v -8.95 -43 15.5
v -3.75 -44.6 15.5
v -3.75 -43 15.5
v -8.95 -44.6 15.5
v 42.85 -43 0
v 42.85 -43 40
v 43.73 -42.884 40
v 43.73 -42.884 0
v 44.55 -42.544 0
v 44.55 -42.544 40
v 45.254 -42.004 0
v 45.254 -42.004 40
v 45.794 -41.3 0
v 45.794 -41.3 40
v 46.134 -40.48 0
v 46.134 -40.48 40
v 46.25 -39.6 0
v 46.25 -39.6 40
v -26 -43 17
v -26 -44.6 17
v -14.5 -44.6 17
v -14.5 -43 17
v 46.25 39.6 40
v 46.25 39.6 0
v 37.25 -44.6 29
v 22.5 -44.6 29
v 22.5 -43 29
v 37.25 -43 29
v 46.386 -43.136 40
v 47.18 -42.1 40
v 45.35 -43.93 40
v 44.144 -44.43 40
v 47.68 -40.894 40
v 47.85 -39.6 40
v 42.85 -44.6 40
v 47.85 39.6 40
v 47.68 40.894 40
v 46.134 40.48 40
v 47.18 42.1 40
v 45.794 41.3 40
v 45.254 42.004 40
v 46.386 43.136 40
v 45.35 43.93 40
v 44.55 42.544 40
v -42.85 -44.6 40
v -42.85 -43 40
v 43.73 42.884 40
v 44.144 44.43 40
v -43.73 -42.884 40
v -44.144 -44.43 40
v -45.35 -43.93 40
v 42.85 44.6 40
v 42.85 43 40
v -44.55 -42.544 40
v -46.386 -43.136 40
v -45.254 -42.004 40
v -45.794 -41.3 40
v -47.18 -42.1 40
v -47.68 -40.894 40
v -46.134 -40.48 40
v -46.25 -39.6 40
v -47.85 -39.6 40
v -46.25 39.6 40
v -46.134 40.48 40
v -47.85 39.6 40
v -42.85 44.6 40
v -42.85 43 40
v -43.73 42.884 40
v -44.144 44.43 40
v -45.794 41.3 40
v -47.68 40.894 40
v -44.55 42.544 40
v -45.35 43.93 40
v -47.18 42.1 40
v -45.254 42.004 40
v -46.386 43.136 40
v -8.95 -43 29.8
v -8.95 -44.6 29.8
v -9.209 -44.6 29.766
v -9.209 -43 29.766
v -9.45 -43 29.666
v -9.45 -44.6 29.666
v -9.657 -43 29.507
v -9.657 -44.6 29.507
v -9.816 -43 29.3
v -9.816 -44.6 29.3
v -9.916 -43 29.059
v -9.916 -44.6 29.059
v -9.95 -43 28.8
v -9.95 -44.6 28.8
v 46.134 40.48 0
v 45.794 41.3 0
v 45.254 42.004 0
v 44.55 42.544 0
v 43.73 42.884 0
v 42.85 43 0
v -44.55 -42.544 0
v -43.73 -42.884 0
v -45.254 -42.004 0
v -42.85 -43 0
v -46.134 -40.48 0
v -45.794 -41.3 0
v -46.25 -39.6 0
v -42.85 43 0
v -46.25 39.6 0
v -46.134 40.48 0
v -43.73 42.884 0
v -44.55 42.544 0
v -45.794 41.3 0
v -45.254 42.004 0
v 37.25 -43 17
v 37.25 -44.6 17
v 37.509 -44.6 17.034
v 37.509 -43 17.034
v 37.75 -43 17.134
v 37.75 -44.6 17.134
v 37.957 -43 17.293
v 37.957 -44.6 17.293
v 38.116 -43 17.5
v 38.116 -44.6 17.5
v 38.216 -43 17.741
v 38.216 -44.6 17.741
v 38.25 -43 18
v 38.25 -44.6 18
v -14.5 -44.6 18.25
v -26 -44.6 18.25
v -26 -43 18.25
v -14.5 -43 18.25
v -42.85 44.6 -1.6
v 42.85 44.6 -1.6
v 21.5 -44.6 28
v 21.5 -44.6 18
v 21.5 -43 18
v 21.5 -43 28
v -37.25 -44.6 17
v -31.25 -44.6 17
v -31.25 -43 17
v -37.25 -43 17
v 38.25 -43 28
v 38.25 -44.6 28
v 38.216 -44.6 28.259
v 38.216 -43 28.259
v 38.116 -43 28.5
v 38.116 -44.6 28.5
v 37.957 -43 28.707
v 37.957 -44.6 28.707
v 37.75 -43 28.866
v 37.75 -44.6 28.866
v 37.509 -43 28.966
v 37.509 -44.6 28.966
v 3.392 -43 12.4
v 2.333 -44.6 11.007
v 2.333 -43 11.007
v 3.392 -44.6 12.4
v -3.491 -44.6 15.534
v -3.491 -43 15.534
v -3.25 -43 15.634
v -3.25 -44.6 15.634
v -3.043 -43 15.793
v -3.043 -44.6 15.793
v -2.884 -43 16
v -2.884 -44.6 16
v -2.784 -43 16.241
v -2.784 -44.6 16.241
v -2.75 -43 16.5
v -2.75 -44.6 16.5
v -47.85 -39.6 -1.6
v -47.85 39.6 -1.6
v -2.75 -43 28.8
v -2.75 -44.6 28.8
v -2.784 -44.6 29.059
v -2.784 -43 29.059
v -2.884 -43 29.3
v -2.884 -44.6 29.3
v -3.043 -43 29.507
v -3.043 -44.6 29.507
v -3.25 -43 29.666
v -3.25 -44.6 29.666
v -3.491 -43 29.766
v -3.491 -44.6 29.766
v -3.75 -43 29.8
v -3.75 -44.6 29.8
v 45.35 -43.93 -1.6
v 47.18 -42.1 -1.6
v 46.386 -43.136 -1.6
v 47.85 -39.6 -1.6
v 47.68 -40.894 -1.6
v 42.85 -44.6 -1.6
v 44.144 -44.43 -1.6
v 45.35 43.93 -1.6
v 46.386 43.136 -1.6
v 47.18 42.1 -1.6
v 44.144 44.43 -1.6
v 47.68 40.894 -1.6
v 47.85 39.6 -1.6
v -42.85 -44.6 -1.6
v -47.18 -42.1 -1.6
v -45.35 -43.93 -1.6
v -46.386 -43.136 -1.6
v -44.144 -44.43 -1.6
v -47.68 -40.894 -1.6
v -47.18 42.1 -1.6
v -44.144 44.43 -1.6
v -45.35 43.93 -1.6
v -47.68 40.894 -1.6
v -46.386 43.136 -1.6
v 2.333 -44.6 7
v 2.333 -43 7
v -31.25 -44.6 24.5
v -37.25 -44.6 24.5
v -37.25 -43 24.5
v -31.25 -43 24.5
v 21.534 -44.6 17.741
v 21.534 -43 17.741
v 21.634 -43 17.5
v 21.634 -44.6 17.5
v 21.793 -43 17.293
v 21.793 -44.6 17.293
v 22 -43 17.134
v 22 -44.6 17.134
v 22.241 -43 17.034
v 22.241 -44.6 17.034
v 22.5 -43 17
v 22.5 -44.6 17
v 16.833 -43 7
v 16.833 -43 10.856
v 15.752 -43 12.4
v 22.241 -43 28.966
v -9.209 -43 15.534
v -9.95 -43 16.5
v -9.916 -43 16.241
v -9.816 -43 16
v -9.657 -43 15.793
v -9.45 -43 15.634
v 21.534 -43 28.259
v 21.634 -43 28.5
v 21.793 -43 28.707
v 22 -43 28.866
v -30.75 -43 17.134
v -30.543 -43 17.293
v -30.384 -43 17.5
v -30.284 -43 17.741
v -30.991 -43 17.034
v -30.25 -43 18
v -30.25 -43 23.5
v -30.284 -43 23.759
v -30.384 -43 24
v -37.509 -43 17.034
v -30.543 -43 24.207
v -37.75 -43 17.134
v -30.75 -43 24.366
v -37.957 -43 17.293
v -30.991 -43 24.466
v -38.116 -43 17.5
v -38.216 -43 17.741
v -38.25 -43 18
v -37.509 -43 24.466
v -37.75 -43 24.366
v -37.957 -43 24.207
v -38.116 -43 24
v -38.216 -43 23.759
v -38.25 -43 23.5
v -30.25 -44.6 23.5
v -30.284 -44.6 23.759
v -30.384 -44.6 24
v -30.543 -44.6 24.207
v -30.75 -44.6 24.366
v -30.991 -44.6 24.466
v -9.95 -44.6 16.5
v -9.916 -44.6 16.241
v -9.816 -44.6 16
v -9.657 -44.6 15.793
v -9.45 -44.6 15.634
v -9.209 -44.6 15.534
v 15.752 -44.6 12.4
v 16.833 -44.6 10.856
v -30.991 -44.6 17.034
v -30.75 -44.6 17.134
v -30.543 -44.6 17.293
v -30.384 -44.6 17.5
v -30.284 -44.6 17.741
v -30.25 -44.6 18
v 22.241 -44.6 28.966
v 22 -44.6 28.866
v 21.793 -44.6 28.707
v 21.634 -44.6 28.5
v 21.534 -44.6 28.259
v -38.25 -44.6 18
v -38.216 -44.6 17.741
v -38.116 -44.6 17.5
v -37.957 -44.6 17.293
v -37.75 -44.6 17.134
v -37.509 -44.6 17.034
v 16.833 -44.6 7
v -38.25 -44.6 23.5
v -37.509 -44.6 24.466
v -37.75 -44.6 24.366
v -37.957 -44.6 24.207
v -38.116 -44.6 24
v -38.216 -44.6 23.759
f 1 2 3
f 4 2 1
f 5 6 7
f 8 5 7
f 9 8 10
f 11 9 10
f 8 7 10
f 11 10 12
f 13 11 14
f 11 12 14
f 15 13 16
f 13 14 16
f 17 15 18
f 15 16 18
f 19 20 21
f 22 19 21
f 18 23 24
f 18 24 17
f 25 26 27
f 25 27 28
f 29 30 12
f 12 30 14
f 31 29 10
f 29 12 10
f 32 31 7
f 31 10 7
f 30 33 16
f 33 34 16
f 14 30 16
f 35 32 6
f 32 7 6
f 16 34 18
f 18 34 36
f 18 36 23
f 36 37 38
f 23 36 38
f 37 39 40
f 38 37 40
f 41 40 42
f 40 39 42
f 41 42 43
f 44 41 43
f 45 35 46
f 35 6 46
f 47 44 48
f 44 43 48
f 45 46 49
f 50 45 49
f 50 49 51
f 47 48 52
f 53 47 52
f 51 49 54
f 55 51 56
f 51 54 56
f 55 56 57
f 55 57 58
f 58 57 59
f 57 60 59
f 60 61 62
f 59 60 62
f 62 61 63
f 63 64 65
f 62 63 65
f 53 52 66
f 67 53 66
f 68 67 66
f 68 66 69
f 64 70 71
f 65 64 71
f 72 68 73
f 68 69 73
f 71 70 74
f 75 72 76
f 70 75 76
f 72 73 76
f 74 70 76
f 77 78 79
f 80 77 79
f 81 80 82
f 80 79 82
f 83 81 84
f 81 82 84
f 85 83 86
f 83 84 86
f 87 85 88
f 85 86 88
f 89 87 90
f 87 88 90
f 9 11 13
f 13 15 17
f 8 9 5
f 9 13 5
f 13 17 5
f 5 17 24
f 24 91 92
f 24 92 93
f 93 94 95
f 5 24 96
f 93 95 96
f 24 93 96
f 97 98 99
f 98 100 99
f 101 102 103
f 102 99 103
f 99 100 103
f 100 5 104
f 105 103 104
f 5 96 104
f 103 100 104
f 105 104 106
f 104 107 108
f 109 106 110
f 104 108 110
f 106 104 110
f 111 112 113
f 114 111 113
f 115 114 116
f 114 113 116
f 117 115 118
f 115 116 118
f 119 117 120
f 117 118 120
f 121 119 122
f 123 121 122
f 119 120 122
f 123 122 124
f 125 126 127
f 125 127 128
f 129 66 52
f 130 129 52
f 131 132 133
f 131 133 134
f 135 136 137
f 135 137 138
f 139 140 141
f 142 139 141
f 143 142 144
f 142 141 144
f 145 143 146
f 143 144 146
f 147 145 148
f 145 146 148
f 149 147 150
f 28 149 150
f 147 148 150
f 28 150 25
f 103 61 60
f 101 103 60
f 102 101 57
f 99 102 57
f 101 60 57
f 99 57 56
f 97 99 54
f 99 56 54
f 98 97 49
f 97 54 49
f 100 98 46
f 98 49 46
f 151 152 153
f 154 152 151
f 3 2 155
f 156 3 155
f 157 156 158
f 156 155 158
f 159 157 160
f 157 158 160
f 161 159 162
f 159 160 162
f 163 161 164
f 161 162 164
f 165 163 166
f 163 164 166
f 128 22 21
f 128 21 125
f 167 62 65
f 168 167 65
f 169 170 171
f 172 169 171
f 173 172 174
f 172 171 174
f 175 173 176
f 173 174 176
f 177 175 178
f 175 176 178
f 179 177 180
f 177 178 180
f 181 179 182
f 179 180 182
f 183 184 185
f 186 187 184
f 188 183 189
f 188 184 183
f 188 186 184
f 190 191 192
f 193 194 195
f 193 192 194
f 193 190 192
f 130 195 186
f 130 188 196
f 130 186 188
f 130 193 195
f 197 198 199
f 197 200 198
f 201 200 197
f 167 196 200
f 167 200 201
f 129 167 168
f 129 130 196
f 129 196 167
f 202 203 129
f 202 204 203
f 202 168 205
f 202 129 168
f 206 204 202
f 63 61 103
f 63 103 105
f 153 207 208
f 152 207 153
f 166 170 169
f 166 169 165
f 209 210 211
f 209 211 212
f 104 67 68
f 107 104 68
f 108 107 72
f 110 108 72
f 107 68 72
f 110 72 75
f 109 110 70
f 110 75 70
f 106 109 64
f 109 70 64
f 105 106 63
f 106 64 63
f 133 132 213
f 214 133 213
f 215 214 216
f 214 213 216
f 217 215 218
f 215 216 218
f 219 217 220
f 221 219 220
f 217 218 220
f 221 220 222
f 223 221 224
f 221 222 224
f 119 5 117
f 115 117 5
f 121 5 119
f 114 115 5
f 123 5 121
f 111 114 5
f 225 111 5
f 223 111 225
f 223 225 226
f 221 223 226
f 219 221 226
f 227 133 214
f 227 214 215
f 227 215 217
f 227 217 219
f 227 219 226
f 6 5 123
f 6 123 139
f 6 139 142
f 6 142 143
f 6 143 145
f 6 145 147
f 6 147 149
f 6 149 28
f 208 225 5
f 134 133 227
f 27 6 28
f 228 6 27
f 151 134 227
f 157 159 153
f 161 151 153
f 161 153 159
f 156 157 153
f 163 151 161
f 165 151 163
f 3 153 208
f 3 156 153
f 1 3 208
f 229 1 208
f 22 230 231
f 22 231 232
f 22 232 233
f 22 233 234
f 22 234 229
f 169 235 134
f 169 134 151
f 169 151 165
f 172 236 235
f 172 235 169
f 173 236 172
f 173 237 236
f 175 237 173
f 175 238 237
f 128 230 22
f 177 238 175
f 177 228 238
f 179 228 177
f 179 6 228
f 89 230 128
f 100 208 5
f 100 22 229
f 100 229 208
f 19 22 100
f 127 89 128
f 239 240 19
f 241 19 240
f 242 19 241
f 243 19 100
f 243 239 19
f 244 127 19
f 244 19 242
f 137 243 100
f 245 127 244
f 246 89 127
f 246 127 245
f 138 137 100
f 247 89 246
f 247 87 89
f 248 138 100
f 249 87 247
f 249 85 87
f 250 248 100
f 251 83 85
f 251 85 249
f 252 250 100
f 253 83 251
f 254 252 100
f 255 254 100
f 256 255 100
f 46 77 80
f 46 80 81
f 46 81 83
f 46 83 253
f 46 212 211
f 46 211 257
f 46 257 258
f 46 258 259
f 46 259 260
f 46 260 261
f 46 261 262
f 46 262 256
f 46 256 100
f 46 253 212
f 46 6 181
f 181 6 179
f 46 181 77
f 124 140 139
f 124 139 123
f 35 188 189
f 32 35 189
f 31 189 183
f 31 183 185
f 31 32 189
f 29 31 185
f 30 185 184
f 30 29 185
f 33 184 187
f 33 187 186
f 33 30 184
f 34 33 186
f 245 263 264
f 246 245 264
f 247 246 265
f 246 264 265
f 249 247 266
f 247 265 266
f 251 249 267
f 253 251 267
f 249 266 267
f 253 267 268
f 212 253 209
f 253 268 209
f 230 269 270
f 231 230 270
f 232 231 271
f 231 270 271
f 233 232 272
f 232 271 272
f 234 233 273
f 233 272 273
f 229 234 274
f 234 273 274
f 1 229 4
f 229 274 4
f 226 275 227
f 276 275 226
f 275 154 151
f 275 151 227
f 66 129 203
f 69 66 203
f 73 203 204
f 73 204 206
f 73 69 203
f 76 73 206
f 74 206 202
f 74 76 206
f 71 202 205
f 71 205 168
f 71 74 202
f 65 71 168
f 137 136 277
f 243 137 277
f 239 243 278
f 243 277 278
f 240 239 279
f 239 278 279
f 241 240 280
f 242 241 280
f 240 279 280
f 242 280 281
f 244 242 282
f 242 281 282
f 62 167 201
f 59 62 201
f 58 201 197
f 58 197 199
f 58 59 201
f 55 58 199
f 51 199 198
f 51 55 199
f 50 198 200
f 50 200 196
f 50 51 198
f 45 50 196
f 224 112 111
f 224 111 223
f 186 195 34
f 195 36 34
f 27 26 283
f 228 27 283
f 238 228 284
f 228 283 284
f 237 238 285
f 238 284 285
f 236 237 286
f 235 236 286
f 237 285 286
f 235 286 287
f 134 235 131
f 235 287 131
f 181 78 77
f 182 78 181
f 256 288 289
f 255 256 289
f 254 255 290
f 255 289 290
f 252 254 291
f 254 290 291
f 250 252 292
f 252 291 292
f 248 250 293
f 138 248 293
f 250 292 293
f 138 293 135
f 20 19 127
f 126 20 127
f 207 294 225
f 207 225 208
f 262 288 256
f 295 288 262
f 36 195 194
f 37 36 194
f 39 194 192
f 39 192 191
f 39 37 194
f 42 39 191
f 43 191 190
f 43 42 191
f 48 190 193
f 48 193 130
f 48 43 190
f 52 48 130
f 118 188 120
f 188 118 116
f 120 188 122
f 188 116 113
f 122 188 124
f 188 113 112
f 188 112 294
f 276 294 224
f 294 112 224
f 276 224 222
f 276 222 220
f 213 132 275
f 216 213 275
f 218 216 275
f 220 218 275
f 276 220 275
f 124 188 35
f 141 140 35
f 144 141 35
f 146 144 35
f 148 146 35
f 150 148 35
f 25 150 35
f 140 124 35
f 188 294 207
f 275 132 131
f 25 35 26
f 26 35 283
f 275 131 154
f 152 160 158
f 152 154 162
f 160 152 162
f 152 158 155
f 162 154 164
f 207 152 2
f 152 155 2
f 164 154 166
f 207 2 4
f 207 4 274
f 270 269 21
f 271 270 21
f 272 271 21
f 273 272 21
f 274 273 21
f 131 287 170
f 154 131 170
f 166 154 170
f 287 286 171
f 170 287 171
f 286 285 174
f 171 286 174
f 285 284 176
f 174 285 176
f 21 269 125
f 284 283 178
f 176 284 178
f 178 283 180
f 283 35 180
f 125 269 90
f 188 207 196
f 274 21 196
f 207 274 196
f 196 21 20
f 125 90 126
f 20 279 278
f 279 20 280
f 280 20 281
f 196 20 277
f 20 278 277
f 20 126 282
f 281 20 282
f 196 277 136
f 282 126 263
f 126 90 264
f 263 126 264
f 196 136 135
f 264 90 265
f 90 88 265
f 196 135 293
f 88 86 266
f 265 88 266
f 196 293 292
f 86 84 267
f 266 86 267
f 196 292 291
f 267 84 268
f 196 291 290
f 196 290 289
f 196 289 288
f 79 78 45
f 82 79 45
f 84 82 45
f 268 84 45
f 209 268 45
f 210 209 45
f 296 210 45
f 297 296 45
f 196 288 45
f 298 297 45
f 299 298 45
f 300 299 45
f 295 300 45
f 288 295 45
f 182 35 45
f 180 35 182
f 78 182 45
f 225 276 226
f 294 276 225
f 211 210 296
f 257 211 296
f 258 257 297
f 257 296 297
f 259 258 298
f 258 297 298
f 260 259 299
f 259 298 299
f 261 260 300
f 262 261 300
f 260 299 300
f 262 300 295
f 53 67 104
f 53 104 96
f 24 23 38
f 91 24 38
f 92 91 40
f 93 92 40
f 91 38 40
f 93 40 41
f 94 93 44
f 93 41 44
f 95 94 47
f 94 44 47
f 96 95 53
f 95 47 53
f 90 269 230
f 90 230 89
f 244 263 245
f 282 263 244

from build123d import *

# Parameters (mm, degrees)
SKETCH004_W       = 11.5
SKETCH004_H       = 1.25
PAD003_DEPTH      = 3.2
PAD005_DEPTH      = 40
PAD005_DEPTH_BACK = 1.6
THICKNESS001_T    = -1.6


with BuildPart() as pad003:
    # Sketch004 → Pad003 (new body)
    with BuildSketch(Plane.XZ.offset(46.2)):
        with BuildLine():
            Line((22.5, 29), (37.25, 29))
            ThreePointArc((38.25, 28), (37.957107, 28.707107), (37.25, 29))
            Line((38.25, 28), (38.25, 18))
            ThreePointArc((37.25, 17), (37.957107, 17.292893), (38.25, 18))
            Line((37.25, 17), (22.5, 17))
            ThreePointArc((21.5, 18), (21.792893, 17.292893), (22.5, 17))
            Line((21.5, 18), (21.5, 28))
            ThreePointArc((22.5, 29), (21.792893, 28.707107), (21.5, 28))
        make_face()
        with BuildLine():
            Line((-8.95, 29.8), (-3.75, 29.8))
            ThreePointArc((-2.75, 28.8), (-3.042893, 29.507107), (-3.75, 29.8))
            Line((-2.75, 28.8), (-2.75, 16.5))
            ThreePointArc((-3.75, 15.5), (-3.042893, 15.792893), (-2.75, 16.5))
            Line((-3.75, 15.5), (-8.95, 15.5))
            ThreePointArc((-9.95, 16.5), (-9.657107, 15.792893), (-8.95, 15.5))
            Line((-9.95, 16.5), (-9.95, 28.8))
            ThreePointArc((-8.95, 29.8), (-9.657107, 29.507107), (-9.95, 28.8))
        make_face()
        with BuildLine():
            Line((-37.25, 24.5), (-31.25, 24.5))
            ThreePointArc((-30.25, 23.5), (-30.542893, 24.207107), (-31.25, 24.5))
            Line((-30.25, 23.5), (-30.25, 18))
            ThreePointArc((-31.25, 17), (-30.542893, 17.292893), (-30.25, 18))
            Line((-31.25, 17), (-37.25, 17))
            ThreePointArc((-38.25, 18), (-37.957107, 17.292893), (-37.25, 17))
            Line((-38.25, 18), (-38.25, 23.5))
            ThreePointArc((-37.25, 24.5), (-37.957107, 24.207107), (-38.25, 23.5))
        make_face()
        with Locations((-20.25, 17.625)):
            Rectangle(SKETCH004_W, SKETCH004_H)
        Polygon((2.333401, 7), (2.333401, 11.006851), (3.391764, 12.4), (15.751917, 12.4), (16.833401, 10.855655), (16.833401, 7), align=None)
    extrude(amount=-PAD003_DEPTH)


with BuildPart() as cut001:
    # Sketch006 → Pad005 (new body, two sides)
    with BuildSketch(Plane.XY) as pad005_sk:
        with BuildLine():
            Line((-42.85, 44.6), (42.85, 44.6))
            ThreePointArc((47.85, 39.6), (46.385534, 43.135534), (42.85, 44.6))
            Line((47.85, 39.6), (47.85, -39.6))
            ThreePointArc((42.85, -44.6), (46.385534, -43.135534), (47.85, -39.6))
            Line((42.85, -44.6), (-42.85, -44.6))
            ThreePointArc((-47.85, -39.6), (-46.385534, -43.135534), (-42.85, -44.6))
            Line((-47.85, -39.6), (-47.85, 39.6))
            ThreePointArc((-42.85, 44.6), (-46.385534, 43.135534), (-47.85, 39.6))
        make_face()
    extrude(amount=PAD005_DEPTH)
    extrude(pad005_sk.sketch, amount=-PAD005_DEPTH_BACK)

    # Thickness001
    thickness001_openings = [cut001.faces().sort_by_distance(p)[0] for p in [
        (0, 0, 40),
    ]]
    offset(amount=THICKNESS001_T, openings=thickness001_openings)

    # Cut001: cut Pad003
    add(pad003.part, mode=Mode.SUBTRACT)


solid = cut001.part
